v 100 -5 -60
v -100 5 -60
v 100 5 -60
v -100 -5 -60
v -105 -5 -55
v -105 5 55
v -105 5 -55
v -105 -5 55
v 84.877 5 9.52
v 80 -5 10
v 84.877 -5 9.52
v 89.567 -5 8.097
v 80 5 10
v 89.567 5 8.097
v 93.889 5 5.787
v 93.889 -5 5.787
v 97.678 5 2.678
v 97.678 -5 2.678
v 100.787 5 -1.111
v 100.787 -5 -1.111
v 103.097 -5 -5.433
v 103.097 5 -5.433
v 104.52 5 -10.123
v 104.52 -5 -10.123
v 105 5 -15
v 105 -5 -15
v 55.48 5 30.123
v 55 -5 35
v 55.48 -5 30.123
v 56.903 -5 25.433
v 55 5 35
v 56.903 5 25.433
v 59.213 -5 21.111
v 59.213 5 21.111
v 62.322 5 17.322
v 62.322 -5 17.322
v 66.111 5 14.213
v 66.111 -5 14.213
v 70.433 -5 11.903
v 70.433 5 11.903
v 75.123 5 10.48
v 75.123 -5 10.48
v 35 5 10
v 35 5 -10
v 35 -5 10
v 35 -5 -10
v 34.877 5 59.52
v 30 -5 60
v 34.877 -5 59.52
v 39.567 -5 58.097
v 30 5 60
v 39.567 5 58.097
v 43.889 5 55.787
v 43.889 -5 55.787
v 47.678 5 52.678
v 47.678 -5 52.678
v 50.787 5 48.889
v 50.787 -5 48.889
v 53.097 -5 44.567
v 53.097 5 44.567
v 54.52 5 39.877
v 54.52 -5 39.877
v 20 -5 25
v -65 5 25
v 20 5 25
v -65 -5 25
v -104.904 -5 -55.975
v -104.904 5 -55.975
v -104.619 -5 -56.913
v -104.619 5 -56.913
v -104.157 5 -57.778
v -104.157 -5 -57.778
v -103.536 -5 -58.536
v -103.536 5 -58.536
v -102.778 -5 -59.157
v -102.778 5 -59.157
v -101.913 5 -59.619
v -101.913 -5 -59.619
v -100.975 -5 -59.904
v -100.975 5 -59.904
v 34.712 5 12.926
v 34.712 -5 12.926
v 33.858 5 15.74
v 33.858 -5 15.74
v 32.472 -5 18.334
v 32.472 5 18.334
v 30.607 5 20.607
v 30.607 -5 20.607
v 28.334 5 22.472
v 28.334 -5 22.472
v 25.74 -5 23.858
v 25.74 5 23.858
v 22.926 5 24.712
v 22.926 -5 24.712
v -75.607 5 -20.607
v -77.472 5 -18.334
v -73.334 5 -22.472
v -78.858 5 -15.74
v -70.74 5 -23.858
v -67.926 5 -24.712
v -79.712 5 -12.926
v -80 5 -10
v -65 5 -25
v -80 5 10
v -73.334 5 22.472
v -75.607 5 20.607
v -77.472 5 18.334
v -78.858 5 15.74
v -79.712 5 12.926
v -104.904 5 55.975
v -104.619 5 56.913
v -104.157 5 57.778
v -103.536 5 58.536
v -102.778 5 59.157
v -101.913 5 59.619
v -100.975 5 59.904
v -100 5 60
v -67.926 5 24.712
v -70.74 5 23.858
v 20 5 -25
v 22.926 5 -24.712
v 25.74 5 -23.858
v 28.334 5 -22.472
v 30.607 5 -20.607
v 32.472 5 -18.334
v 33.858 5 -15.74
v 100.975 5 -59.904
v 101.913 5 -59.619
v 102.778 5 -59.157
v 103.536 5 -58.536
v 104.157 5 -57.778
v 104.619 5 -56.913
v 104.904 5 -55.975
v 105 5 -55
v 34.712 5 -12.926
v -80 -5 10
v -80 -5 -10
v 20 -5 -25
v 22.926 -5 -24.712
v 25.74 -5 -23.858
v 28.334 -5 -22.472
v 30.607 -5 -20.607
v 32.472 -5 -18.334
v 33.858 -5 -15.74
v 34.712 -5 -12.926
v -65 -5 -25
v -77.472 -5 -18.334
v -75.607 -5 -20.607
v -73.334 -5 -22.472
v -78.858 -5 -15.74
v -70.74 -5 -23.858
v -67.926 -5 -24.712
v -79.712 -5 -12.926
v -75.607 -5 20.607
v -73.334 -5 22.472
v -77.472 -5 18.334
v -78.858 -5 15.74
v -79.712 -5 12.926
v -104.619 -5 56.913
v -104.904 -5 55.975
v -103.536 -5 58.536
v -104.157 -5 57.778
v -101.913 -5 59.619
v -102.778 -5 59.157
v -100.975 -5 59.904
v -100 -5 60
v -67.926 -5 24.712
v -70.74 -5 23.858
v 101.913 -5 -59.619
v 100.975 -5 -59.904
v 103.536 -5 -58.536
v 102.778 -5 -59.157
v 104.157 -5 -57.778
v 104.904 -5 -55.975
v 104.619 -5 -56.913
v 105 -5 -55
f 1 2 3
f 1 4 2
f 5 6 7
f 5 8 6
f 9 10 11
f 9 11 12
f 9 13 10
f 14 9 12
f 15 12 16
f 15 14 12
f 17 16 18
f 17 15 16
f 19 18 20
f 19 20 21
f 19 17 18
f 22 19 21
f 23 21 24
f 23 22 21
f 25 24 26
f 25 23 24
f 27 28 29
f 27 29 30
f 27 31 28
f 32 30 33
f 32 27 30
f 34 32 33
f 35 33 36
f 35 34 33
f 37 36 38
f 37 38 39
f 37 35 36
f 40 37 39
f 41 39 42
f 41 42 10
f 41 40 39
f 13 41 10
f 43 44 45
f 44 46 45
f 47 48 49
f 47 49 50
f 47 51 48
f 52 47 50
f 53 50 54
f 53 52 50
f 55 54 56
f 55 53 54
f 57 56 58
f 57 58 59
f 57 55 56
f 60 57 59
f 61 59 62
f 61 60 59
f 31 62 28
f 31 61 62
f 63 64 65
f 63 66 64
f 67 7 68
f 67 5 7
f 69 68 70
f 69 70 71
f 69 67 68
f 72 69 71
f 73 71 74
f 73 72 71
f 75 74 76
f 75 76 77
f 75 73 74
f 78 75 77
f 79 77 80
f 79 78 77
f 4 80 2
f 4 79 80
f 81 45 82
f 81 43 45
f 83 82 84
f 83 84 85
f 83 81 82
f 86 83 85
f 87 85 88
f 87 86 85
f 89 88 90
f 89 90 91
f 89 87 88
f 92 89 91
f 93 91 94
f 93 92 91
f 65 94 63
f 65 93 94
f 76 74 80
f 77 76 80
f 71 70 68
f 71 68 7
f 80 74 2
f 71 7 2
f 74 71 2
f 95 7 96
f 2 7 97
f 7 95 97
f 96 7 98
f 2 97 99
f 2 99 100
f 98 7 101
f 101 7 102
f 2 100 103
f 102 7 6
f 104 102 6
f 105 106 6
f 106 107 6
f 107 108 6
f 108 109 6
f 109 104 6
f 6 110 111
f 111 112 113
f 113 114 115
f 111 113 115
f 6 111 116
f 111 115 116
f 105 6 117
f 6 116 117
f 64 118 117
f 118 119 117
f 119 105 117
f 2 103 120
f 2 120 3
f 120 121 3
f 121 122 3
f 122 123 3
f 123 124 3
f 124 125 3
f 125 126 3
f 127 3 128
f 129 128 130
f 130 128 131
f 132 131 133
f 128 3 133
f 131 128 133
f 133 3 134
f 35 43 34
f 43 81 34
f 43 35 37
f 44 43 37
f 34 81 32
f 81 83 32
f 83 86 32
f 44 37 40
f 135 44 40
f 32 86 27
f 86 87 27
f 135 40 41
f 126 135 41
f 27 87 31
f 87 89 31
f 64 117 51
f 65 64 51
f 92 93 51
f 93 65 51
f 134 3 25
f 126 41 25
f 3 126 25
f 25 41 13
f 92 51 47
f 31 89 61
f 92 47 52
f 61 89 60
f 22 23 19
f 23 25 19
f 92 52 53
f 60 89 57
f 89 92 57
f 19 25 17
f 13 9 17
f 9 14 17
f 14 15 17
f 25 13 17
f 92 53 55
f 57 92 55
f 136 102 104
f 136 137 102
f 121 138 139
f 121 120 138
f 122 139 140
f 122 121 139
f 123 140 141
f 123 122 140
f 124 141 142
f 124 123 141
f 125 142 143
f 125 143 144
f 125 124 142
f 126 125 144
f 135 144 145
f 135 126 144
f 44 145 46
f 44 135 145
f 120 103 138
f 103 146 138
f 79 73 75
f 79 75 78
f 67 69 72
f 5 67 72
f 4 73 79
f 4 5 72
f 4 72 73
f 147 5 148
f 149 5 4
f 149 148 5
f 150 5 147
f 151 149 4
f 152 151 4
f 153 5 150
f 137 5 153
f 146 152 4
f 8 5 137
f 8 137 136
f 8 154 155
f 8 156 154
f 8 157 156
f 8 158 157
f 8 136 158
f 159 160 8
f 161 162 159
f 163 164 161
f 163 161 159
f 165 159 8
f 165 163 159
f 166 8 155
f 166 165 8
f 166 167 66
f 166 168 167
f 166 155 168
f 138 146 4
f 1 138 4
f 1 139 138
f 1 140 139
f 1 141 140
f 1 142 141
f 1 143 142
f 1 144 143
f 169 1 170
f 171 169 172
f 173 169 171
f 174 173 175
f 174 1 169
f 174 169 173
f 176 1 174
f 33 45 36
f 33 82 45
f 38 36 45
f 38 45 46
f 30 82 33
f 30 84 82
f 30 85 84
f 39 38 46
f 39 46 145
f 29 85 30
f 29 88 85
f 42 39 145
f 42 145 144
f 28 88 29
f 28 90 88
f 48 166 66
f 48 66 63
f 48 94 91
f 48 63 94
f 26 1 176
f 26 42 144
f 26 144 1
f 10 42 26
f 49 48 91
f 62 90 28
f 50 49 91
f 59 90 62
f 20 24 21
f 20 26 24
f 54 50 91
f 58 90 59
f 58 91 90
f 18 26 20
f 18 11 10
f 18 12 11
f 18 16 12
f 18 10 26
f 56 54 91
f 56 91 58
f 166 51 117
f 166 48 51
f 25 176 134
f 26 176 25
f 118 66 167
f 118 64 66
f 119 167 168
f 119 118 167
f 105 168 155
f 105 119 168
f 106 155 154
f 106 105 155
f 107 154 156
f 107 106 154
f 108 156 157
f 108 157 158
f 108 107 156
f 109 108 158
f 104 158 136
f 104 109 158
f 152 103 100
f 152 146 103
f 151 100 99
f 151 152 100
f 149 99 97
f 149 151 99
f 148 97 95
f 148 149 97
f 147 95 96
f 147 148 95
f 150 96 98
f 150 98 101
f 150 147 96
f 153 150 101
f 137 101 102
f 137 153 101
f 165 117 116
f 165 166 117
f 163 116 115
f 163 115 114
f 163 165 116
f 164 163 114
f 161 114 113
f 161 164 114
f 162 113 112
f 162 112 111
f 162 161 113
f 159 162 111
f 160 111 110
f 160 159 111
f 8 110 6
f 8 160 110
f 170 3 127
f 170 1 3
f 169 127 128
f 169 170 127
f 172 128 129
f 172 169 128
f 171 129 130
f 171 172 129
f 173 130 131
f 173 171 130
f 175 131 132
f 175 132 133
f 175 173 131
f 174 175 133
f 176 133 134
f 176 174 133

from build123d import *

# Parameters (mm, degrees)
F0_W     = 115
F0_H     = 50
F1_DEPTH = 5
F2_R     = 24.99999
F3_R     = 5
F4_R     = 15


# Not quite as in the source:
# - a fillet or chamfer is up to 0.001 mm smaller than in the source, because OpenCascade refuses the exact size


with BuildPart() as f1:
    # F0 (on Front) → F1 (new body, symmetric)
    with BuildSketch(Plane.XZ):
        Polygon((55, 60), (-105, 60), (-105, -60), (105, -60), (105, 10), (55, 10), align=None)
        with Locations((-22.5, 0)):
            Rectangle(F0_W, F0_H, mode=Mode.SUBTRACT)
    extrude(amount=F1_DEPTH, both=True)

    # F2 (radius 25 in the source; OpenCascade refuses exactly that, so slightly less here)
    f2_edges = [f1.edges().sort_by_distance(p)[0] for p in [
        (55, 0, 10),
        (105, 0, 10),
        (55, 0, 60),
    ]]
    fillet(f2_edges, radius=F2_R)

    # F3
    f3_edges = [f1.edges().sort_by_distance(p)[0] for p in [
        (105, 0, -60),
        (-105, 0, -60),
        (-105, 0, 60),
    ]]
    fillet(f3_edges, radius=F3_R)

    # F4
    f4_edges = [f1.edges().sort_by_distance(p)[0] for p in [
        (-80, 0, -25),
        (35, 0, -25),
        (35, 0, 25),
        (-80, 0, 25),
    ]]
    fillet(f4_edges, radius=F4_R)


solid = f1.part
